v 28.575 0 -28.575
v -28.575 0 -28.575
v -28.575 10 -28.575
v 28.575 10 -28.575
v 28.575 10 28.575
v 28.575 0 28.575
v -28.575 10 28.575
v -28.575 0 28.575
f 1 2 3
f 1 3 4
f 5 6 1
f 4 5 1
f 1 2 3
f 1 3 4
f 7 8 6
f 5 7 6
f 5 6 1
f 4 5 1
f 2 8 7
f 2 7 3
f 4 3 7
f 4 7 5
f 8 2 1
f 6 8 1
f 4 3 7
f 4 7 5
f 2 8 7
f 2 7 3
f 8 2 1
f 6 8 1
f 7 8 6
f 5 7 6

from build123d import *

# Parameters (mm, degrees)
SKETCH1_W           = 57.15
SKETCH1_H           = 57.15
BOSS_EXTRUDE1_DEPTH = 10
SKETCH2_W           = 57.15
SKETCH2_H           = 57.15
BOSS_EXTRUDE2_DEPTH = 10


with BuildPart() as part:
    # Sketch1 → Boss-Extrude1 (new body)
    with BuildSketch(Plane(origin=(0, 0, 0), x_dir=(1, 0, 0), z_dir=(0, 1, 0))):
        Rectangle(SKETCH1_W, SKETCH1_H)
    extrude(amount=BOSS_EXTRUDE1_DEPTH)


with BuildPart() as body_2:
    # Sketch2 → Boss-Extrude2 (new body)
    with BuildSketch(Plane(origin=(0, 0, 0), x_dir=(1, 0, 0), z_dir=(0, 1, 0))):
        Rectangle(SKETCH2_W, SKETCH2_H)
    extrude(amount=BOSS_EXTRUDE2_DEPTH)


solid = Compound([part.part, body_2.part])
